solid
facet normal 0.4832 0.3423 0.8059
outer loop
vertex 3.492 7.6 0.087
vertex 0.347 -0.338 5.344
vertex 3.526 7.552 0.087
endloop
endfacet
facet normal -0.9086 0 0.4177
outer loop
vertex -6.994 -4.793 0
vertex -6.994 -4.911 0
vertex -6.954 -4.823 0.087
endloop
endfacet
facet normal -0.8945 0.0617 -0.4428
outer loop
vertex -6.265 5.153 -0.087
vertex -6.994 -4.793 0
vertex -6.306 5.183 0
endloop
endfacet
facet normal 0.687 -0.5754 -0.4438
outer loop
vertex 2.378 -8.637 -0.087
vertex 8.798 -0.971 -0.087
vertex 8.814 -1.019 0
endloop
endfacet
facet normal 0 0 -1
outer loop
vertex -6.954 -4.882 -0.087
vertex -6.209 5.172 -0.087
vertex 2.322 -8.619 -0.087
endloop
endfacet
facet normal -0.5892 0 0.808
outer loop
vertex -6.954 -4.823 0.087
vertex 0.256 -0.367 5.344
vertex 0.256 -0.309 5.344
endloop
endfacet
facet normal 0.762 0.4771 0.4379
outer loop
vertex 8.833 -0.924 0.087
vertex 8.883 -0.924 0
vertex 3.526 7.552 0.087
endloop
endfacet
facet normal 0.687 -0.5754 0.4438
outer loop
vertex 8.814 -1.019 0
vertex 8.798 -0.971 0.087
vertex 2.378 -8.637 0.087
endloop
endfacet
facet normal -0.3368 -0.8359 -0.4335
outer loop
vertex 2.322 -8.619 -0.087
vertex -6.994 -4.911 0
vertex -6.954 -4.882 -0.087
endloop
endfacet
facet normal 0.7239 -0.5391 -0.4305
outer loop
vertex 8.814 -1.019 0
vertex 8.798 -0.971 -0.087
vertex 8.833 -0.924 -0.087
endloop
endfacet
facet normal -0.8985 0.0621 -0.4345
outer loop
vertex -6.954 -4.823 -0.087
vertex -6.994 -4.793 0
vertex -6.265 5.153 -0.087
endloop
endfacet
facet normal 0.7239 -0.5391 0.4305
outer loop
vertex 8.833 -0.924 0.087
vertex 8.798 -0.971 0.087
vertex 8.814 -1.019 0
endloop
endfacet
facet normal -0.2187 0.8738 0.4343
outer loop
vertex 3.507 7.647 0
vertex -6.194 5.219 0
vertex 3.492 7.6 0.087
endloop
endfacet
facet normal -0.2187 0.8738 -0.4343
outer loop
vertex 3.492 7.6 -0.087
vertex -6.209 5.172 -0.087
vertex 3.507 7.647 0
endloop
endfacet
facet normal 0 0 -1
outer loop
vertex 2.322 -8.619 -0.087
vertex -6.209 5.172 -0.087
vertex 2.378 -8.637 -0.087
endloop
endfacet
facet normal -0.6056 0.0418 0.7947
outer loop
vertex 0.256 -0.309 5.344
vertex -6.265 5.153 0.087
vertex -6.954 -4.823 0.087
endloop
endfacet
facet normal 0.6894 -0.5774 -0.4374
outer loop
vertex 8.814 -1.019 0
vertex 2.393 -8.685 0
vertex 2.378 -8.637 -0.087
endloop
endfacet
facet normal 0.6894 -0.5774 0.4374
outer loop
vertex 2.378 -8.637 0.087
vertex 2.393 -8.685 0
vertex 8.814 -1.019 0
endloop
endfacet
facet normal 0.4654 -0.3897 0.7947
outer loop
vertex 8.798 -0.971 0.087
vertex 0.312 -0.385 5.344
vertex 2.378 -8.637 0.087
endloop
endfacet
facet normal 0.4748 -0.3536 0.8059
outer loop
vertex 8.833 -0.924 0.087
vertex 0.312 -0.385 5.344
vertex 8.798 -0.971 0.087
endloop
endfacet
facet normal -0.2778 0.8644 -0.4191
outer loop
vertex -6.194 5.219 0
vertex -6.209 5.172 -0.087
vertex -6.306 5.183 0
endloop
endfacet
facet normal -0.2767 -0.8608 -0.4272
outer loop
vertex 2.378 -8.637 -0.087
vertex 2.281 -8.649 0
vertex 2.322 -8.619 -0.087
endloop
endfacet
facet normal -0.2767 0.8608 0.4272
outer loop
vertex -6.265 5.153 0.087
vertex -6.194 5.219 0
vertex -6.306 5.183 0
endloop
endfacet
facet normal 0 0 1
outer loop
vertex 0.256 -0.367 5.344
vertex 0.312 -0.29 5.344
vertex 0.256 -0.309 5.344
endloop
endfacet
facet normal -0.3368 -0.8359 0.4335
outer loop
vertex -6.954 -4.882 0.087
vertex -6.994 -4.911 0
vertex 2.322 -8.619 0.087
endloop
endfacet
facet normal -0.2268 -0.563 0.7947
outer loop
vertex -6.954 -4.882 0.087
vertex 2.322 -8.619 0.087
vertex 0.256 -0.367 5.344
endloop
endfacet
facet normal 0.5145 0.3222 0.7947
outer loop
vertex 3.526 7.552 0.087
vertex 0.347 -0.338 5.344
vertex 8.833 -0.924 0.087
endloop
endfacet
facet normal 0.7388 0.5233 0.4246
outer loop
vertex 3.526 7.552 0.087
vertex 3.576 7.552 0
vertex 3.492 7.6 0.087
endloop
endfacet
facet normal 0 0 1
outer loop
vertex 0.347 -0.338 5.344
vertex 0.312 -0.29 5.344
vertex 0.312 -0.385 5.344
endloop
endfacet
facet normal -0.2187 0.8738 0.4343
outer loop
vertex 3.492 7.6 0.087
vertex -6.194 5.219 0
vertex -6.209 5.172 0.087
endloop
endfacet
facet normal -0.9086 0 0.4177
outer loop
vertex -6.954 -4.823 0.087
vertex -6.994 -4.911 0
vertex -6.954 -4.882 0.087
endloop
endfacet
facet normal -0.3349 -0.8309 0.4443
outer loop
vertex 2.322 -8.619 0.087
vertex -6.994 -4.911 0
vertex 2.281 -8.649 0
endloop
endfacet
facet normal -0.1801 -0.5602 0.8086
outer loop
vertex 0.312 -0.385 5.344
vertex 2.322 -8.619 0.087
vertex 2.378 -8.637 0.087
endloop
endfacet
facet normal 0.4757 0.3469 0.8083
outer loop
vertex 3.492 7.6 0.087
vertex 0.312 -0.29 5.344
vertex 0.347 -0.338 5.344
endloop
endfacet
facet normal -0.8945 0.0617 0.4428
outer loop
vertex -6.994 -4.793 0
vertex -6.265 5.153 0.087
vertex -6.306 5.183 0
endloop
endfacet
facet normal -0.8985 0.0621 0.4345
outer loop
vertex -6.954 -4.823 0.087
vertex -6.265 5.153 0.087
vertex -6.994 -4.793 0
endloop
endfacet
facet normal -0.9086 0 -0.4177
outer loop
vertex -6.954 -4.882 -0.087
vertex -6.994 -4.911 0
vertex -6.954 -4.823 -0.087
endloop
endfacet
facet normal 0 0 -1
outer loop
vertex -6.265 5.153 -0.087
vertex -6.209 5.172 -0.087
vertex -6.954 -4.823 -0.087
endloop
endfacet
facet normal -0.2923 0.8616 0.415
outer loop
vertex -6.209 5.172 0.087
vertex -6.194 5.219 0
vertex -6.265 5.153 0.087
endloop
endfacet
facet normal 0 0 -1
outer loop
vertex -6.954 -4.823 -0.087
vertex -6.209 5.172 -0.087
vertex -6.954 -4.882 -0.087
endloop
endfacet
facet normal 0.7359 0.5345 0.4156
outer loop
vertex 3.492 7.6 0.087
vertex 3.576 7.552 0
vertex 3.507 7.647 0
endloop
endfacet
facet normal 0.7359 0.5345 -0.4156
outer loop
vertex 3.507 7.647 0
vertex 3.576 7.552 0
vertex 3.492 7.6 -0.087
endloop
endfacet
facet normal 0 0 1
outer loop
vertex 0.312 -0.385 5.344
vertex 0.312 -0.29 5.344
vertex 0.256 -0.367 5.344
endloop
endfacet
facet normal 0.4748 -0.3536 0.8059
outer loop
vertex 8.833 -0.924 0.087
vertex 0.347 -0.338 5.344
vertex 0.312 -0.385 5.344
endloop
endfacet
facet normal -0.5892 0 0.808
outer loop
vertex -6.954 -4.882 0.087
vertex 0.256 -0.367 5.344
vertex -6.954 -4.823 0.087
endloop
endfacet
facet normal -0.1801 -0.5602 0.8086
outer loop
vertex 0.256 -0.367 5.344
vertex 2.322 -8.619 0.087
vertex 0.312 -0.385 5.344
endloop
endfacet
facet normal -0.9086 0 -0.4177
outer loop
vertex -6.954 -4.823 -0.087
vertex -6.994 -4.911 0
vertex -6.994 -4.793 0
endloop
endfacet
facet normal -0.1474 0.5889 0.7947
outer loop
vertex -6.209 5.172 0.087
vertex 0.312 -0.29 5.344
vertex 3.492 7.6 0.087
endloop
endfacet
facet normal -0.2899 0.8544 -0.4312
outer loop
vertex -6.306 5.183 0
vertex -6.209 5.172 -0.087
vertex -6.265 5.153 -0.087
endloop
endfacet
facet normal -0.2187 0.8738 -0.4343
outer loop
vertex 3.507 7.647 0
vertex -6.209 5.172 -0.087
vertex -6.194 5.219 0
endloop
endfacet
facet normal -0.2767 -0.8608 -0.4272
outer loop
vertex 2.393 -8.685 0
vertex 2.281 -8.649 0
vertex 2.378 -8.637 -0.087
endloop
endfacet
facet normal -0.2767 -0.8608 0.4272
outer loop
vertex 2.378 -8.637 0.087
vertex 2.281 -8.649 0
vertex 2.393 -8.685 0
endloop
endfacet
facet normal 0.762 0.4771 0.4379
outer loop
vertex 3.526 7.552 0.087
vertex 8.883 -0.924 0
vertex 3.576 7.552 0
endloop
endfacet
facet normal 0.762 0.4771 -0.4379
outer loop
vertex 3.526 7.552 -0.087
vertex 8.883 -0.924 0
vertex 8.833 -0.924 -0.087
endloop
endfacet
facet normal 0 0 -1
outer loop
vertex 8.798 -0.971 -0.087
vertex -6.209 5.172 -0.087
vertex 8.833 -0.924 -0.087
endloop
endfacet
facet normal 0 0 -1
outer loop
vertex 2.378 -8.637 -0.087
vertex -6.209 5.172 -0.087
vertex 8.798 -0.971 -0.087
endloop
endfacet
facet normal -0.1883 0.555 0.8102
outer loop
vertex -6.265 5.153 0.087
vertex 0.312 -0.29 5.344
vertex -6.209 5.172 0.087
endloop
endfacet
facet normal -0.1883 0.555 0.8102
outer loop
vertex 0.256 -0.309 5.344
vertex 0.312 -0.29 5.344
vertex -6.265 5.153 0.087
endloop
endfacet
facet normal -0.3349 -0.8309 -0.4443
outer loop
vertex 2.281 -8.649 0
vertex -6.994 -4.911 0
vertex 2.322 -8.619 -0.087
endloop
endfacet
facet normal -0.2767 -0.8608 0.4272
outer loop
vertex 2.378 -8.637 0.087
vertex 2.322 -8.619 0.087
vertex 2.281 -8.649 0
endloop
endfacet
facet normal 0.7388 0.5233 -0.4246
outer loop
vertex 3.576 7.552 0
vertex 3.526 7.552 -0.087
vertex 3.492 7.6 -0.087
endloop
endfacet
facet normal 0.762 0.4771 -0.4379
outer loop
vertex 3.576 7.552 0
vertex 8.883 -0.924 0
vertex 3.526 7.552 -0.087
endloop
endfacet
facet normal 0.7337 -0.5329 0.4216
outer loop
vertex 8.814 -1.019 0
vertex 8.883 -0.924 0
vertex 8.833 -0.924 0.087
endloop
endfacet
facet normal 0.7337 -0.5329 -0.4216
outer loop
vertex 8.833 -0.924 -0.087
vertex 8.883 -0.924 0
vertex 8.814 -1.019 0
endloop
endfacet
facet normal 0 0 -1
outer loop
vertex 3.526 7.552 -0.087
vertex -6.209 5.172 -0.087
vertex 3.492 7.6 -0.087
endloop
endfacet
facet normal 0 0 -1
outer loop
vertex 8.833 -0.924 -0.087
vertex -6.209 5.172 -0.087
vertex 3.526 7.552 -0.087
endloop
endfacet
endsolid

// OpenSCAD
// Auto-generated OpenSCAD file

    inner_points = 10*[[0.23620735966763612, -0.8589852711237532, 6.281120552158003e-15], [0.3476109579235432, 0.7552090254358436, 7.186745320395964e-14], [-0.6913160481523587, -0.48522020059684634, -1.2256510252105723e-13], [-0.6224648379611696, 0.5124067391232119, -8.203051974478681e-14], [0.8782995612527119, -0.092357848796825, 1.2644704850972638e-13], [0.0296673985459932, -0.03378951119168972, 0.5257311121191336]];

    outer_points = 10*[[0.5545913541974953, -0.130465753147186, 0.6316754822336427], [-0.8029377257364648, -0.130465753147186, -0.24874986149718784], [0.7445891768936461, 0.3415637761071865, -0.22918975163436395], [-0.09440993522191399, 0.3415637761071865, -0.7733225386168263], [-0.4018328701327624, -0.422196045920001, 0.6195866695147354], [0.14198138773148855, -0.4564076590866669, -0.2189213021039538]];

    // Convex hull for inner set (I)
    module inner_hull() {
        hull() {
            for (p = inner_points) {
                translate(p) sphere(r=0.1);
            }
        }
    }

    // Convex hull for outer set (O) minus inner hull (O \ I)
    module outer_minus_inner() {
        difference() {
            hull() {
                for (p = outer_points) {
                    translate(p) sphere(r=0.1);
                }
            }
            inner_hull(); // Subtract inner hull
        }
    }

    // Convex hull for outer set (O) minus all translated inner hulls
    module outer_minus_AllTranslationInner() {
        difference() {
            hull() {
                for (p = outer_points) {
                    translate(p) sphere(r=0.1);
                }
            }
            hull() {
                translate([0,0,50]) inner_hull();
                translate([0,0,-50]) inner_hull();
            }; // Subtract translated inner hulls
        }
    }

    // Difference between outer_minus_inner and outer_minus_AllTranslationInner
    module outer_minus_inner_diff() {
        difference() {
            // Outer minus inner
            difference() {
                hull() {
                    for (p = outer_points) {
                        translate(p) sphere(r=0.1);
                    }
                }
                inner_hull();
            }

            // Subtract Outer minus AllTranslationInner
            difference() {
                hull() {
                    for (p = outer_points) {
                        translate(p) sphere(r=0.1);
                    }
                }
                hull() {
                    translate([0,0,50]) inner_hull();
                    translate([0,0,-50]) inner_hull();
                };
            }
        }
    }

    // Rendering all with colors applied
    color([1, 0, 0, 0.5]) inner_hull(); // Transparent red
    
